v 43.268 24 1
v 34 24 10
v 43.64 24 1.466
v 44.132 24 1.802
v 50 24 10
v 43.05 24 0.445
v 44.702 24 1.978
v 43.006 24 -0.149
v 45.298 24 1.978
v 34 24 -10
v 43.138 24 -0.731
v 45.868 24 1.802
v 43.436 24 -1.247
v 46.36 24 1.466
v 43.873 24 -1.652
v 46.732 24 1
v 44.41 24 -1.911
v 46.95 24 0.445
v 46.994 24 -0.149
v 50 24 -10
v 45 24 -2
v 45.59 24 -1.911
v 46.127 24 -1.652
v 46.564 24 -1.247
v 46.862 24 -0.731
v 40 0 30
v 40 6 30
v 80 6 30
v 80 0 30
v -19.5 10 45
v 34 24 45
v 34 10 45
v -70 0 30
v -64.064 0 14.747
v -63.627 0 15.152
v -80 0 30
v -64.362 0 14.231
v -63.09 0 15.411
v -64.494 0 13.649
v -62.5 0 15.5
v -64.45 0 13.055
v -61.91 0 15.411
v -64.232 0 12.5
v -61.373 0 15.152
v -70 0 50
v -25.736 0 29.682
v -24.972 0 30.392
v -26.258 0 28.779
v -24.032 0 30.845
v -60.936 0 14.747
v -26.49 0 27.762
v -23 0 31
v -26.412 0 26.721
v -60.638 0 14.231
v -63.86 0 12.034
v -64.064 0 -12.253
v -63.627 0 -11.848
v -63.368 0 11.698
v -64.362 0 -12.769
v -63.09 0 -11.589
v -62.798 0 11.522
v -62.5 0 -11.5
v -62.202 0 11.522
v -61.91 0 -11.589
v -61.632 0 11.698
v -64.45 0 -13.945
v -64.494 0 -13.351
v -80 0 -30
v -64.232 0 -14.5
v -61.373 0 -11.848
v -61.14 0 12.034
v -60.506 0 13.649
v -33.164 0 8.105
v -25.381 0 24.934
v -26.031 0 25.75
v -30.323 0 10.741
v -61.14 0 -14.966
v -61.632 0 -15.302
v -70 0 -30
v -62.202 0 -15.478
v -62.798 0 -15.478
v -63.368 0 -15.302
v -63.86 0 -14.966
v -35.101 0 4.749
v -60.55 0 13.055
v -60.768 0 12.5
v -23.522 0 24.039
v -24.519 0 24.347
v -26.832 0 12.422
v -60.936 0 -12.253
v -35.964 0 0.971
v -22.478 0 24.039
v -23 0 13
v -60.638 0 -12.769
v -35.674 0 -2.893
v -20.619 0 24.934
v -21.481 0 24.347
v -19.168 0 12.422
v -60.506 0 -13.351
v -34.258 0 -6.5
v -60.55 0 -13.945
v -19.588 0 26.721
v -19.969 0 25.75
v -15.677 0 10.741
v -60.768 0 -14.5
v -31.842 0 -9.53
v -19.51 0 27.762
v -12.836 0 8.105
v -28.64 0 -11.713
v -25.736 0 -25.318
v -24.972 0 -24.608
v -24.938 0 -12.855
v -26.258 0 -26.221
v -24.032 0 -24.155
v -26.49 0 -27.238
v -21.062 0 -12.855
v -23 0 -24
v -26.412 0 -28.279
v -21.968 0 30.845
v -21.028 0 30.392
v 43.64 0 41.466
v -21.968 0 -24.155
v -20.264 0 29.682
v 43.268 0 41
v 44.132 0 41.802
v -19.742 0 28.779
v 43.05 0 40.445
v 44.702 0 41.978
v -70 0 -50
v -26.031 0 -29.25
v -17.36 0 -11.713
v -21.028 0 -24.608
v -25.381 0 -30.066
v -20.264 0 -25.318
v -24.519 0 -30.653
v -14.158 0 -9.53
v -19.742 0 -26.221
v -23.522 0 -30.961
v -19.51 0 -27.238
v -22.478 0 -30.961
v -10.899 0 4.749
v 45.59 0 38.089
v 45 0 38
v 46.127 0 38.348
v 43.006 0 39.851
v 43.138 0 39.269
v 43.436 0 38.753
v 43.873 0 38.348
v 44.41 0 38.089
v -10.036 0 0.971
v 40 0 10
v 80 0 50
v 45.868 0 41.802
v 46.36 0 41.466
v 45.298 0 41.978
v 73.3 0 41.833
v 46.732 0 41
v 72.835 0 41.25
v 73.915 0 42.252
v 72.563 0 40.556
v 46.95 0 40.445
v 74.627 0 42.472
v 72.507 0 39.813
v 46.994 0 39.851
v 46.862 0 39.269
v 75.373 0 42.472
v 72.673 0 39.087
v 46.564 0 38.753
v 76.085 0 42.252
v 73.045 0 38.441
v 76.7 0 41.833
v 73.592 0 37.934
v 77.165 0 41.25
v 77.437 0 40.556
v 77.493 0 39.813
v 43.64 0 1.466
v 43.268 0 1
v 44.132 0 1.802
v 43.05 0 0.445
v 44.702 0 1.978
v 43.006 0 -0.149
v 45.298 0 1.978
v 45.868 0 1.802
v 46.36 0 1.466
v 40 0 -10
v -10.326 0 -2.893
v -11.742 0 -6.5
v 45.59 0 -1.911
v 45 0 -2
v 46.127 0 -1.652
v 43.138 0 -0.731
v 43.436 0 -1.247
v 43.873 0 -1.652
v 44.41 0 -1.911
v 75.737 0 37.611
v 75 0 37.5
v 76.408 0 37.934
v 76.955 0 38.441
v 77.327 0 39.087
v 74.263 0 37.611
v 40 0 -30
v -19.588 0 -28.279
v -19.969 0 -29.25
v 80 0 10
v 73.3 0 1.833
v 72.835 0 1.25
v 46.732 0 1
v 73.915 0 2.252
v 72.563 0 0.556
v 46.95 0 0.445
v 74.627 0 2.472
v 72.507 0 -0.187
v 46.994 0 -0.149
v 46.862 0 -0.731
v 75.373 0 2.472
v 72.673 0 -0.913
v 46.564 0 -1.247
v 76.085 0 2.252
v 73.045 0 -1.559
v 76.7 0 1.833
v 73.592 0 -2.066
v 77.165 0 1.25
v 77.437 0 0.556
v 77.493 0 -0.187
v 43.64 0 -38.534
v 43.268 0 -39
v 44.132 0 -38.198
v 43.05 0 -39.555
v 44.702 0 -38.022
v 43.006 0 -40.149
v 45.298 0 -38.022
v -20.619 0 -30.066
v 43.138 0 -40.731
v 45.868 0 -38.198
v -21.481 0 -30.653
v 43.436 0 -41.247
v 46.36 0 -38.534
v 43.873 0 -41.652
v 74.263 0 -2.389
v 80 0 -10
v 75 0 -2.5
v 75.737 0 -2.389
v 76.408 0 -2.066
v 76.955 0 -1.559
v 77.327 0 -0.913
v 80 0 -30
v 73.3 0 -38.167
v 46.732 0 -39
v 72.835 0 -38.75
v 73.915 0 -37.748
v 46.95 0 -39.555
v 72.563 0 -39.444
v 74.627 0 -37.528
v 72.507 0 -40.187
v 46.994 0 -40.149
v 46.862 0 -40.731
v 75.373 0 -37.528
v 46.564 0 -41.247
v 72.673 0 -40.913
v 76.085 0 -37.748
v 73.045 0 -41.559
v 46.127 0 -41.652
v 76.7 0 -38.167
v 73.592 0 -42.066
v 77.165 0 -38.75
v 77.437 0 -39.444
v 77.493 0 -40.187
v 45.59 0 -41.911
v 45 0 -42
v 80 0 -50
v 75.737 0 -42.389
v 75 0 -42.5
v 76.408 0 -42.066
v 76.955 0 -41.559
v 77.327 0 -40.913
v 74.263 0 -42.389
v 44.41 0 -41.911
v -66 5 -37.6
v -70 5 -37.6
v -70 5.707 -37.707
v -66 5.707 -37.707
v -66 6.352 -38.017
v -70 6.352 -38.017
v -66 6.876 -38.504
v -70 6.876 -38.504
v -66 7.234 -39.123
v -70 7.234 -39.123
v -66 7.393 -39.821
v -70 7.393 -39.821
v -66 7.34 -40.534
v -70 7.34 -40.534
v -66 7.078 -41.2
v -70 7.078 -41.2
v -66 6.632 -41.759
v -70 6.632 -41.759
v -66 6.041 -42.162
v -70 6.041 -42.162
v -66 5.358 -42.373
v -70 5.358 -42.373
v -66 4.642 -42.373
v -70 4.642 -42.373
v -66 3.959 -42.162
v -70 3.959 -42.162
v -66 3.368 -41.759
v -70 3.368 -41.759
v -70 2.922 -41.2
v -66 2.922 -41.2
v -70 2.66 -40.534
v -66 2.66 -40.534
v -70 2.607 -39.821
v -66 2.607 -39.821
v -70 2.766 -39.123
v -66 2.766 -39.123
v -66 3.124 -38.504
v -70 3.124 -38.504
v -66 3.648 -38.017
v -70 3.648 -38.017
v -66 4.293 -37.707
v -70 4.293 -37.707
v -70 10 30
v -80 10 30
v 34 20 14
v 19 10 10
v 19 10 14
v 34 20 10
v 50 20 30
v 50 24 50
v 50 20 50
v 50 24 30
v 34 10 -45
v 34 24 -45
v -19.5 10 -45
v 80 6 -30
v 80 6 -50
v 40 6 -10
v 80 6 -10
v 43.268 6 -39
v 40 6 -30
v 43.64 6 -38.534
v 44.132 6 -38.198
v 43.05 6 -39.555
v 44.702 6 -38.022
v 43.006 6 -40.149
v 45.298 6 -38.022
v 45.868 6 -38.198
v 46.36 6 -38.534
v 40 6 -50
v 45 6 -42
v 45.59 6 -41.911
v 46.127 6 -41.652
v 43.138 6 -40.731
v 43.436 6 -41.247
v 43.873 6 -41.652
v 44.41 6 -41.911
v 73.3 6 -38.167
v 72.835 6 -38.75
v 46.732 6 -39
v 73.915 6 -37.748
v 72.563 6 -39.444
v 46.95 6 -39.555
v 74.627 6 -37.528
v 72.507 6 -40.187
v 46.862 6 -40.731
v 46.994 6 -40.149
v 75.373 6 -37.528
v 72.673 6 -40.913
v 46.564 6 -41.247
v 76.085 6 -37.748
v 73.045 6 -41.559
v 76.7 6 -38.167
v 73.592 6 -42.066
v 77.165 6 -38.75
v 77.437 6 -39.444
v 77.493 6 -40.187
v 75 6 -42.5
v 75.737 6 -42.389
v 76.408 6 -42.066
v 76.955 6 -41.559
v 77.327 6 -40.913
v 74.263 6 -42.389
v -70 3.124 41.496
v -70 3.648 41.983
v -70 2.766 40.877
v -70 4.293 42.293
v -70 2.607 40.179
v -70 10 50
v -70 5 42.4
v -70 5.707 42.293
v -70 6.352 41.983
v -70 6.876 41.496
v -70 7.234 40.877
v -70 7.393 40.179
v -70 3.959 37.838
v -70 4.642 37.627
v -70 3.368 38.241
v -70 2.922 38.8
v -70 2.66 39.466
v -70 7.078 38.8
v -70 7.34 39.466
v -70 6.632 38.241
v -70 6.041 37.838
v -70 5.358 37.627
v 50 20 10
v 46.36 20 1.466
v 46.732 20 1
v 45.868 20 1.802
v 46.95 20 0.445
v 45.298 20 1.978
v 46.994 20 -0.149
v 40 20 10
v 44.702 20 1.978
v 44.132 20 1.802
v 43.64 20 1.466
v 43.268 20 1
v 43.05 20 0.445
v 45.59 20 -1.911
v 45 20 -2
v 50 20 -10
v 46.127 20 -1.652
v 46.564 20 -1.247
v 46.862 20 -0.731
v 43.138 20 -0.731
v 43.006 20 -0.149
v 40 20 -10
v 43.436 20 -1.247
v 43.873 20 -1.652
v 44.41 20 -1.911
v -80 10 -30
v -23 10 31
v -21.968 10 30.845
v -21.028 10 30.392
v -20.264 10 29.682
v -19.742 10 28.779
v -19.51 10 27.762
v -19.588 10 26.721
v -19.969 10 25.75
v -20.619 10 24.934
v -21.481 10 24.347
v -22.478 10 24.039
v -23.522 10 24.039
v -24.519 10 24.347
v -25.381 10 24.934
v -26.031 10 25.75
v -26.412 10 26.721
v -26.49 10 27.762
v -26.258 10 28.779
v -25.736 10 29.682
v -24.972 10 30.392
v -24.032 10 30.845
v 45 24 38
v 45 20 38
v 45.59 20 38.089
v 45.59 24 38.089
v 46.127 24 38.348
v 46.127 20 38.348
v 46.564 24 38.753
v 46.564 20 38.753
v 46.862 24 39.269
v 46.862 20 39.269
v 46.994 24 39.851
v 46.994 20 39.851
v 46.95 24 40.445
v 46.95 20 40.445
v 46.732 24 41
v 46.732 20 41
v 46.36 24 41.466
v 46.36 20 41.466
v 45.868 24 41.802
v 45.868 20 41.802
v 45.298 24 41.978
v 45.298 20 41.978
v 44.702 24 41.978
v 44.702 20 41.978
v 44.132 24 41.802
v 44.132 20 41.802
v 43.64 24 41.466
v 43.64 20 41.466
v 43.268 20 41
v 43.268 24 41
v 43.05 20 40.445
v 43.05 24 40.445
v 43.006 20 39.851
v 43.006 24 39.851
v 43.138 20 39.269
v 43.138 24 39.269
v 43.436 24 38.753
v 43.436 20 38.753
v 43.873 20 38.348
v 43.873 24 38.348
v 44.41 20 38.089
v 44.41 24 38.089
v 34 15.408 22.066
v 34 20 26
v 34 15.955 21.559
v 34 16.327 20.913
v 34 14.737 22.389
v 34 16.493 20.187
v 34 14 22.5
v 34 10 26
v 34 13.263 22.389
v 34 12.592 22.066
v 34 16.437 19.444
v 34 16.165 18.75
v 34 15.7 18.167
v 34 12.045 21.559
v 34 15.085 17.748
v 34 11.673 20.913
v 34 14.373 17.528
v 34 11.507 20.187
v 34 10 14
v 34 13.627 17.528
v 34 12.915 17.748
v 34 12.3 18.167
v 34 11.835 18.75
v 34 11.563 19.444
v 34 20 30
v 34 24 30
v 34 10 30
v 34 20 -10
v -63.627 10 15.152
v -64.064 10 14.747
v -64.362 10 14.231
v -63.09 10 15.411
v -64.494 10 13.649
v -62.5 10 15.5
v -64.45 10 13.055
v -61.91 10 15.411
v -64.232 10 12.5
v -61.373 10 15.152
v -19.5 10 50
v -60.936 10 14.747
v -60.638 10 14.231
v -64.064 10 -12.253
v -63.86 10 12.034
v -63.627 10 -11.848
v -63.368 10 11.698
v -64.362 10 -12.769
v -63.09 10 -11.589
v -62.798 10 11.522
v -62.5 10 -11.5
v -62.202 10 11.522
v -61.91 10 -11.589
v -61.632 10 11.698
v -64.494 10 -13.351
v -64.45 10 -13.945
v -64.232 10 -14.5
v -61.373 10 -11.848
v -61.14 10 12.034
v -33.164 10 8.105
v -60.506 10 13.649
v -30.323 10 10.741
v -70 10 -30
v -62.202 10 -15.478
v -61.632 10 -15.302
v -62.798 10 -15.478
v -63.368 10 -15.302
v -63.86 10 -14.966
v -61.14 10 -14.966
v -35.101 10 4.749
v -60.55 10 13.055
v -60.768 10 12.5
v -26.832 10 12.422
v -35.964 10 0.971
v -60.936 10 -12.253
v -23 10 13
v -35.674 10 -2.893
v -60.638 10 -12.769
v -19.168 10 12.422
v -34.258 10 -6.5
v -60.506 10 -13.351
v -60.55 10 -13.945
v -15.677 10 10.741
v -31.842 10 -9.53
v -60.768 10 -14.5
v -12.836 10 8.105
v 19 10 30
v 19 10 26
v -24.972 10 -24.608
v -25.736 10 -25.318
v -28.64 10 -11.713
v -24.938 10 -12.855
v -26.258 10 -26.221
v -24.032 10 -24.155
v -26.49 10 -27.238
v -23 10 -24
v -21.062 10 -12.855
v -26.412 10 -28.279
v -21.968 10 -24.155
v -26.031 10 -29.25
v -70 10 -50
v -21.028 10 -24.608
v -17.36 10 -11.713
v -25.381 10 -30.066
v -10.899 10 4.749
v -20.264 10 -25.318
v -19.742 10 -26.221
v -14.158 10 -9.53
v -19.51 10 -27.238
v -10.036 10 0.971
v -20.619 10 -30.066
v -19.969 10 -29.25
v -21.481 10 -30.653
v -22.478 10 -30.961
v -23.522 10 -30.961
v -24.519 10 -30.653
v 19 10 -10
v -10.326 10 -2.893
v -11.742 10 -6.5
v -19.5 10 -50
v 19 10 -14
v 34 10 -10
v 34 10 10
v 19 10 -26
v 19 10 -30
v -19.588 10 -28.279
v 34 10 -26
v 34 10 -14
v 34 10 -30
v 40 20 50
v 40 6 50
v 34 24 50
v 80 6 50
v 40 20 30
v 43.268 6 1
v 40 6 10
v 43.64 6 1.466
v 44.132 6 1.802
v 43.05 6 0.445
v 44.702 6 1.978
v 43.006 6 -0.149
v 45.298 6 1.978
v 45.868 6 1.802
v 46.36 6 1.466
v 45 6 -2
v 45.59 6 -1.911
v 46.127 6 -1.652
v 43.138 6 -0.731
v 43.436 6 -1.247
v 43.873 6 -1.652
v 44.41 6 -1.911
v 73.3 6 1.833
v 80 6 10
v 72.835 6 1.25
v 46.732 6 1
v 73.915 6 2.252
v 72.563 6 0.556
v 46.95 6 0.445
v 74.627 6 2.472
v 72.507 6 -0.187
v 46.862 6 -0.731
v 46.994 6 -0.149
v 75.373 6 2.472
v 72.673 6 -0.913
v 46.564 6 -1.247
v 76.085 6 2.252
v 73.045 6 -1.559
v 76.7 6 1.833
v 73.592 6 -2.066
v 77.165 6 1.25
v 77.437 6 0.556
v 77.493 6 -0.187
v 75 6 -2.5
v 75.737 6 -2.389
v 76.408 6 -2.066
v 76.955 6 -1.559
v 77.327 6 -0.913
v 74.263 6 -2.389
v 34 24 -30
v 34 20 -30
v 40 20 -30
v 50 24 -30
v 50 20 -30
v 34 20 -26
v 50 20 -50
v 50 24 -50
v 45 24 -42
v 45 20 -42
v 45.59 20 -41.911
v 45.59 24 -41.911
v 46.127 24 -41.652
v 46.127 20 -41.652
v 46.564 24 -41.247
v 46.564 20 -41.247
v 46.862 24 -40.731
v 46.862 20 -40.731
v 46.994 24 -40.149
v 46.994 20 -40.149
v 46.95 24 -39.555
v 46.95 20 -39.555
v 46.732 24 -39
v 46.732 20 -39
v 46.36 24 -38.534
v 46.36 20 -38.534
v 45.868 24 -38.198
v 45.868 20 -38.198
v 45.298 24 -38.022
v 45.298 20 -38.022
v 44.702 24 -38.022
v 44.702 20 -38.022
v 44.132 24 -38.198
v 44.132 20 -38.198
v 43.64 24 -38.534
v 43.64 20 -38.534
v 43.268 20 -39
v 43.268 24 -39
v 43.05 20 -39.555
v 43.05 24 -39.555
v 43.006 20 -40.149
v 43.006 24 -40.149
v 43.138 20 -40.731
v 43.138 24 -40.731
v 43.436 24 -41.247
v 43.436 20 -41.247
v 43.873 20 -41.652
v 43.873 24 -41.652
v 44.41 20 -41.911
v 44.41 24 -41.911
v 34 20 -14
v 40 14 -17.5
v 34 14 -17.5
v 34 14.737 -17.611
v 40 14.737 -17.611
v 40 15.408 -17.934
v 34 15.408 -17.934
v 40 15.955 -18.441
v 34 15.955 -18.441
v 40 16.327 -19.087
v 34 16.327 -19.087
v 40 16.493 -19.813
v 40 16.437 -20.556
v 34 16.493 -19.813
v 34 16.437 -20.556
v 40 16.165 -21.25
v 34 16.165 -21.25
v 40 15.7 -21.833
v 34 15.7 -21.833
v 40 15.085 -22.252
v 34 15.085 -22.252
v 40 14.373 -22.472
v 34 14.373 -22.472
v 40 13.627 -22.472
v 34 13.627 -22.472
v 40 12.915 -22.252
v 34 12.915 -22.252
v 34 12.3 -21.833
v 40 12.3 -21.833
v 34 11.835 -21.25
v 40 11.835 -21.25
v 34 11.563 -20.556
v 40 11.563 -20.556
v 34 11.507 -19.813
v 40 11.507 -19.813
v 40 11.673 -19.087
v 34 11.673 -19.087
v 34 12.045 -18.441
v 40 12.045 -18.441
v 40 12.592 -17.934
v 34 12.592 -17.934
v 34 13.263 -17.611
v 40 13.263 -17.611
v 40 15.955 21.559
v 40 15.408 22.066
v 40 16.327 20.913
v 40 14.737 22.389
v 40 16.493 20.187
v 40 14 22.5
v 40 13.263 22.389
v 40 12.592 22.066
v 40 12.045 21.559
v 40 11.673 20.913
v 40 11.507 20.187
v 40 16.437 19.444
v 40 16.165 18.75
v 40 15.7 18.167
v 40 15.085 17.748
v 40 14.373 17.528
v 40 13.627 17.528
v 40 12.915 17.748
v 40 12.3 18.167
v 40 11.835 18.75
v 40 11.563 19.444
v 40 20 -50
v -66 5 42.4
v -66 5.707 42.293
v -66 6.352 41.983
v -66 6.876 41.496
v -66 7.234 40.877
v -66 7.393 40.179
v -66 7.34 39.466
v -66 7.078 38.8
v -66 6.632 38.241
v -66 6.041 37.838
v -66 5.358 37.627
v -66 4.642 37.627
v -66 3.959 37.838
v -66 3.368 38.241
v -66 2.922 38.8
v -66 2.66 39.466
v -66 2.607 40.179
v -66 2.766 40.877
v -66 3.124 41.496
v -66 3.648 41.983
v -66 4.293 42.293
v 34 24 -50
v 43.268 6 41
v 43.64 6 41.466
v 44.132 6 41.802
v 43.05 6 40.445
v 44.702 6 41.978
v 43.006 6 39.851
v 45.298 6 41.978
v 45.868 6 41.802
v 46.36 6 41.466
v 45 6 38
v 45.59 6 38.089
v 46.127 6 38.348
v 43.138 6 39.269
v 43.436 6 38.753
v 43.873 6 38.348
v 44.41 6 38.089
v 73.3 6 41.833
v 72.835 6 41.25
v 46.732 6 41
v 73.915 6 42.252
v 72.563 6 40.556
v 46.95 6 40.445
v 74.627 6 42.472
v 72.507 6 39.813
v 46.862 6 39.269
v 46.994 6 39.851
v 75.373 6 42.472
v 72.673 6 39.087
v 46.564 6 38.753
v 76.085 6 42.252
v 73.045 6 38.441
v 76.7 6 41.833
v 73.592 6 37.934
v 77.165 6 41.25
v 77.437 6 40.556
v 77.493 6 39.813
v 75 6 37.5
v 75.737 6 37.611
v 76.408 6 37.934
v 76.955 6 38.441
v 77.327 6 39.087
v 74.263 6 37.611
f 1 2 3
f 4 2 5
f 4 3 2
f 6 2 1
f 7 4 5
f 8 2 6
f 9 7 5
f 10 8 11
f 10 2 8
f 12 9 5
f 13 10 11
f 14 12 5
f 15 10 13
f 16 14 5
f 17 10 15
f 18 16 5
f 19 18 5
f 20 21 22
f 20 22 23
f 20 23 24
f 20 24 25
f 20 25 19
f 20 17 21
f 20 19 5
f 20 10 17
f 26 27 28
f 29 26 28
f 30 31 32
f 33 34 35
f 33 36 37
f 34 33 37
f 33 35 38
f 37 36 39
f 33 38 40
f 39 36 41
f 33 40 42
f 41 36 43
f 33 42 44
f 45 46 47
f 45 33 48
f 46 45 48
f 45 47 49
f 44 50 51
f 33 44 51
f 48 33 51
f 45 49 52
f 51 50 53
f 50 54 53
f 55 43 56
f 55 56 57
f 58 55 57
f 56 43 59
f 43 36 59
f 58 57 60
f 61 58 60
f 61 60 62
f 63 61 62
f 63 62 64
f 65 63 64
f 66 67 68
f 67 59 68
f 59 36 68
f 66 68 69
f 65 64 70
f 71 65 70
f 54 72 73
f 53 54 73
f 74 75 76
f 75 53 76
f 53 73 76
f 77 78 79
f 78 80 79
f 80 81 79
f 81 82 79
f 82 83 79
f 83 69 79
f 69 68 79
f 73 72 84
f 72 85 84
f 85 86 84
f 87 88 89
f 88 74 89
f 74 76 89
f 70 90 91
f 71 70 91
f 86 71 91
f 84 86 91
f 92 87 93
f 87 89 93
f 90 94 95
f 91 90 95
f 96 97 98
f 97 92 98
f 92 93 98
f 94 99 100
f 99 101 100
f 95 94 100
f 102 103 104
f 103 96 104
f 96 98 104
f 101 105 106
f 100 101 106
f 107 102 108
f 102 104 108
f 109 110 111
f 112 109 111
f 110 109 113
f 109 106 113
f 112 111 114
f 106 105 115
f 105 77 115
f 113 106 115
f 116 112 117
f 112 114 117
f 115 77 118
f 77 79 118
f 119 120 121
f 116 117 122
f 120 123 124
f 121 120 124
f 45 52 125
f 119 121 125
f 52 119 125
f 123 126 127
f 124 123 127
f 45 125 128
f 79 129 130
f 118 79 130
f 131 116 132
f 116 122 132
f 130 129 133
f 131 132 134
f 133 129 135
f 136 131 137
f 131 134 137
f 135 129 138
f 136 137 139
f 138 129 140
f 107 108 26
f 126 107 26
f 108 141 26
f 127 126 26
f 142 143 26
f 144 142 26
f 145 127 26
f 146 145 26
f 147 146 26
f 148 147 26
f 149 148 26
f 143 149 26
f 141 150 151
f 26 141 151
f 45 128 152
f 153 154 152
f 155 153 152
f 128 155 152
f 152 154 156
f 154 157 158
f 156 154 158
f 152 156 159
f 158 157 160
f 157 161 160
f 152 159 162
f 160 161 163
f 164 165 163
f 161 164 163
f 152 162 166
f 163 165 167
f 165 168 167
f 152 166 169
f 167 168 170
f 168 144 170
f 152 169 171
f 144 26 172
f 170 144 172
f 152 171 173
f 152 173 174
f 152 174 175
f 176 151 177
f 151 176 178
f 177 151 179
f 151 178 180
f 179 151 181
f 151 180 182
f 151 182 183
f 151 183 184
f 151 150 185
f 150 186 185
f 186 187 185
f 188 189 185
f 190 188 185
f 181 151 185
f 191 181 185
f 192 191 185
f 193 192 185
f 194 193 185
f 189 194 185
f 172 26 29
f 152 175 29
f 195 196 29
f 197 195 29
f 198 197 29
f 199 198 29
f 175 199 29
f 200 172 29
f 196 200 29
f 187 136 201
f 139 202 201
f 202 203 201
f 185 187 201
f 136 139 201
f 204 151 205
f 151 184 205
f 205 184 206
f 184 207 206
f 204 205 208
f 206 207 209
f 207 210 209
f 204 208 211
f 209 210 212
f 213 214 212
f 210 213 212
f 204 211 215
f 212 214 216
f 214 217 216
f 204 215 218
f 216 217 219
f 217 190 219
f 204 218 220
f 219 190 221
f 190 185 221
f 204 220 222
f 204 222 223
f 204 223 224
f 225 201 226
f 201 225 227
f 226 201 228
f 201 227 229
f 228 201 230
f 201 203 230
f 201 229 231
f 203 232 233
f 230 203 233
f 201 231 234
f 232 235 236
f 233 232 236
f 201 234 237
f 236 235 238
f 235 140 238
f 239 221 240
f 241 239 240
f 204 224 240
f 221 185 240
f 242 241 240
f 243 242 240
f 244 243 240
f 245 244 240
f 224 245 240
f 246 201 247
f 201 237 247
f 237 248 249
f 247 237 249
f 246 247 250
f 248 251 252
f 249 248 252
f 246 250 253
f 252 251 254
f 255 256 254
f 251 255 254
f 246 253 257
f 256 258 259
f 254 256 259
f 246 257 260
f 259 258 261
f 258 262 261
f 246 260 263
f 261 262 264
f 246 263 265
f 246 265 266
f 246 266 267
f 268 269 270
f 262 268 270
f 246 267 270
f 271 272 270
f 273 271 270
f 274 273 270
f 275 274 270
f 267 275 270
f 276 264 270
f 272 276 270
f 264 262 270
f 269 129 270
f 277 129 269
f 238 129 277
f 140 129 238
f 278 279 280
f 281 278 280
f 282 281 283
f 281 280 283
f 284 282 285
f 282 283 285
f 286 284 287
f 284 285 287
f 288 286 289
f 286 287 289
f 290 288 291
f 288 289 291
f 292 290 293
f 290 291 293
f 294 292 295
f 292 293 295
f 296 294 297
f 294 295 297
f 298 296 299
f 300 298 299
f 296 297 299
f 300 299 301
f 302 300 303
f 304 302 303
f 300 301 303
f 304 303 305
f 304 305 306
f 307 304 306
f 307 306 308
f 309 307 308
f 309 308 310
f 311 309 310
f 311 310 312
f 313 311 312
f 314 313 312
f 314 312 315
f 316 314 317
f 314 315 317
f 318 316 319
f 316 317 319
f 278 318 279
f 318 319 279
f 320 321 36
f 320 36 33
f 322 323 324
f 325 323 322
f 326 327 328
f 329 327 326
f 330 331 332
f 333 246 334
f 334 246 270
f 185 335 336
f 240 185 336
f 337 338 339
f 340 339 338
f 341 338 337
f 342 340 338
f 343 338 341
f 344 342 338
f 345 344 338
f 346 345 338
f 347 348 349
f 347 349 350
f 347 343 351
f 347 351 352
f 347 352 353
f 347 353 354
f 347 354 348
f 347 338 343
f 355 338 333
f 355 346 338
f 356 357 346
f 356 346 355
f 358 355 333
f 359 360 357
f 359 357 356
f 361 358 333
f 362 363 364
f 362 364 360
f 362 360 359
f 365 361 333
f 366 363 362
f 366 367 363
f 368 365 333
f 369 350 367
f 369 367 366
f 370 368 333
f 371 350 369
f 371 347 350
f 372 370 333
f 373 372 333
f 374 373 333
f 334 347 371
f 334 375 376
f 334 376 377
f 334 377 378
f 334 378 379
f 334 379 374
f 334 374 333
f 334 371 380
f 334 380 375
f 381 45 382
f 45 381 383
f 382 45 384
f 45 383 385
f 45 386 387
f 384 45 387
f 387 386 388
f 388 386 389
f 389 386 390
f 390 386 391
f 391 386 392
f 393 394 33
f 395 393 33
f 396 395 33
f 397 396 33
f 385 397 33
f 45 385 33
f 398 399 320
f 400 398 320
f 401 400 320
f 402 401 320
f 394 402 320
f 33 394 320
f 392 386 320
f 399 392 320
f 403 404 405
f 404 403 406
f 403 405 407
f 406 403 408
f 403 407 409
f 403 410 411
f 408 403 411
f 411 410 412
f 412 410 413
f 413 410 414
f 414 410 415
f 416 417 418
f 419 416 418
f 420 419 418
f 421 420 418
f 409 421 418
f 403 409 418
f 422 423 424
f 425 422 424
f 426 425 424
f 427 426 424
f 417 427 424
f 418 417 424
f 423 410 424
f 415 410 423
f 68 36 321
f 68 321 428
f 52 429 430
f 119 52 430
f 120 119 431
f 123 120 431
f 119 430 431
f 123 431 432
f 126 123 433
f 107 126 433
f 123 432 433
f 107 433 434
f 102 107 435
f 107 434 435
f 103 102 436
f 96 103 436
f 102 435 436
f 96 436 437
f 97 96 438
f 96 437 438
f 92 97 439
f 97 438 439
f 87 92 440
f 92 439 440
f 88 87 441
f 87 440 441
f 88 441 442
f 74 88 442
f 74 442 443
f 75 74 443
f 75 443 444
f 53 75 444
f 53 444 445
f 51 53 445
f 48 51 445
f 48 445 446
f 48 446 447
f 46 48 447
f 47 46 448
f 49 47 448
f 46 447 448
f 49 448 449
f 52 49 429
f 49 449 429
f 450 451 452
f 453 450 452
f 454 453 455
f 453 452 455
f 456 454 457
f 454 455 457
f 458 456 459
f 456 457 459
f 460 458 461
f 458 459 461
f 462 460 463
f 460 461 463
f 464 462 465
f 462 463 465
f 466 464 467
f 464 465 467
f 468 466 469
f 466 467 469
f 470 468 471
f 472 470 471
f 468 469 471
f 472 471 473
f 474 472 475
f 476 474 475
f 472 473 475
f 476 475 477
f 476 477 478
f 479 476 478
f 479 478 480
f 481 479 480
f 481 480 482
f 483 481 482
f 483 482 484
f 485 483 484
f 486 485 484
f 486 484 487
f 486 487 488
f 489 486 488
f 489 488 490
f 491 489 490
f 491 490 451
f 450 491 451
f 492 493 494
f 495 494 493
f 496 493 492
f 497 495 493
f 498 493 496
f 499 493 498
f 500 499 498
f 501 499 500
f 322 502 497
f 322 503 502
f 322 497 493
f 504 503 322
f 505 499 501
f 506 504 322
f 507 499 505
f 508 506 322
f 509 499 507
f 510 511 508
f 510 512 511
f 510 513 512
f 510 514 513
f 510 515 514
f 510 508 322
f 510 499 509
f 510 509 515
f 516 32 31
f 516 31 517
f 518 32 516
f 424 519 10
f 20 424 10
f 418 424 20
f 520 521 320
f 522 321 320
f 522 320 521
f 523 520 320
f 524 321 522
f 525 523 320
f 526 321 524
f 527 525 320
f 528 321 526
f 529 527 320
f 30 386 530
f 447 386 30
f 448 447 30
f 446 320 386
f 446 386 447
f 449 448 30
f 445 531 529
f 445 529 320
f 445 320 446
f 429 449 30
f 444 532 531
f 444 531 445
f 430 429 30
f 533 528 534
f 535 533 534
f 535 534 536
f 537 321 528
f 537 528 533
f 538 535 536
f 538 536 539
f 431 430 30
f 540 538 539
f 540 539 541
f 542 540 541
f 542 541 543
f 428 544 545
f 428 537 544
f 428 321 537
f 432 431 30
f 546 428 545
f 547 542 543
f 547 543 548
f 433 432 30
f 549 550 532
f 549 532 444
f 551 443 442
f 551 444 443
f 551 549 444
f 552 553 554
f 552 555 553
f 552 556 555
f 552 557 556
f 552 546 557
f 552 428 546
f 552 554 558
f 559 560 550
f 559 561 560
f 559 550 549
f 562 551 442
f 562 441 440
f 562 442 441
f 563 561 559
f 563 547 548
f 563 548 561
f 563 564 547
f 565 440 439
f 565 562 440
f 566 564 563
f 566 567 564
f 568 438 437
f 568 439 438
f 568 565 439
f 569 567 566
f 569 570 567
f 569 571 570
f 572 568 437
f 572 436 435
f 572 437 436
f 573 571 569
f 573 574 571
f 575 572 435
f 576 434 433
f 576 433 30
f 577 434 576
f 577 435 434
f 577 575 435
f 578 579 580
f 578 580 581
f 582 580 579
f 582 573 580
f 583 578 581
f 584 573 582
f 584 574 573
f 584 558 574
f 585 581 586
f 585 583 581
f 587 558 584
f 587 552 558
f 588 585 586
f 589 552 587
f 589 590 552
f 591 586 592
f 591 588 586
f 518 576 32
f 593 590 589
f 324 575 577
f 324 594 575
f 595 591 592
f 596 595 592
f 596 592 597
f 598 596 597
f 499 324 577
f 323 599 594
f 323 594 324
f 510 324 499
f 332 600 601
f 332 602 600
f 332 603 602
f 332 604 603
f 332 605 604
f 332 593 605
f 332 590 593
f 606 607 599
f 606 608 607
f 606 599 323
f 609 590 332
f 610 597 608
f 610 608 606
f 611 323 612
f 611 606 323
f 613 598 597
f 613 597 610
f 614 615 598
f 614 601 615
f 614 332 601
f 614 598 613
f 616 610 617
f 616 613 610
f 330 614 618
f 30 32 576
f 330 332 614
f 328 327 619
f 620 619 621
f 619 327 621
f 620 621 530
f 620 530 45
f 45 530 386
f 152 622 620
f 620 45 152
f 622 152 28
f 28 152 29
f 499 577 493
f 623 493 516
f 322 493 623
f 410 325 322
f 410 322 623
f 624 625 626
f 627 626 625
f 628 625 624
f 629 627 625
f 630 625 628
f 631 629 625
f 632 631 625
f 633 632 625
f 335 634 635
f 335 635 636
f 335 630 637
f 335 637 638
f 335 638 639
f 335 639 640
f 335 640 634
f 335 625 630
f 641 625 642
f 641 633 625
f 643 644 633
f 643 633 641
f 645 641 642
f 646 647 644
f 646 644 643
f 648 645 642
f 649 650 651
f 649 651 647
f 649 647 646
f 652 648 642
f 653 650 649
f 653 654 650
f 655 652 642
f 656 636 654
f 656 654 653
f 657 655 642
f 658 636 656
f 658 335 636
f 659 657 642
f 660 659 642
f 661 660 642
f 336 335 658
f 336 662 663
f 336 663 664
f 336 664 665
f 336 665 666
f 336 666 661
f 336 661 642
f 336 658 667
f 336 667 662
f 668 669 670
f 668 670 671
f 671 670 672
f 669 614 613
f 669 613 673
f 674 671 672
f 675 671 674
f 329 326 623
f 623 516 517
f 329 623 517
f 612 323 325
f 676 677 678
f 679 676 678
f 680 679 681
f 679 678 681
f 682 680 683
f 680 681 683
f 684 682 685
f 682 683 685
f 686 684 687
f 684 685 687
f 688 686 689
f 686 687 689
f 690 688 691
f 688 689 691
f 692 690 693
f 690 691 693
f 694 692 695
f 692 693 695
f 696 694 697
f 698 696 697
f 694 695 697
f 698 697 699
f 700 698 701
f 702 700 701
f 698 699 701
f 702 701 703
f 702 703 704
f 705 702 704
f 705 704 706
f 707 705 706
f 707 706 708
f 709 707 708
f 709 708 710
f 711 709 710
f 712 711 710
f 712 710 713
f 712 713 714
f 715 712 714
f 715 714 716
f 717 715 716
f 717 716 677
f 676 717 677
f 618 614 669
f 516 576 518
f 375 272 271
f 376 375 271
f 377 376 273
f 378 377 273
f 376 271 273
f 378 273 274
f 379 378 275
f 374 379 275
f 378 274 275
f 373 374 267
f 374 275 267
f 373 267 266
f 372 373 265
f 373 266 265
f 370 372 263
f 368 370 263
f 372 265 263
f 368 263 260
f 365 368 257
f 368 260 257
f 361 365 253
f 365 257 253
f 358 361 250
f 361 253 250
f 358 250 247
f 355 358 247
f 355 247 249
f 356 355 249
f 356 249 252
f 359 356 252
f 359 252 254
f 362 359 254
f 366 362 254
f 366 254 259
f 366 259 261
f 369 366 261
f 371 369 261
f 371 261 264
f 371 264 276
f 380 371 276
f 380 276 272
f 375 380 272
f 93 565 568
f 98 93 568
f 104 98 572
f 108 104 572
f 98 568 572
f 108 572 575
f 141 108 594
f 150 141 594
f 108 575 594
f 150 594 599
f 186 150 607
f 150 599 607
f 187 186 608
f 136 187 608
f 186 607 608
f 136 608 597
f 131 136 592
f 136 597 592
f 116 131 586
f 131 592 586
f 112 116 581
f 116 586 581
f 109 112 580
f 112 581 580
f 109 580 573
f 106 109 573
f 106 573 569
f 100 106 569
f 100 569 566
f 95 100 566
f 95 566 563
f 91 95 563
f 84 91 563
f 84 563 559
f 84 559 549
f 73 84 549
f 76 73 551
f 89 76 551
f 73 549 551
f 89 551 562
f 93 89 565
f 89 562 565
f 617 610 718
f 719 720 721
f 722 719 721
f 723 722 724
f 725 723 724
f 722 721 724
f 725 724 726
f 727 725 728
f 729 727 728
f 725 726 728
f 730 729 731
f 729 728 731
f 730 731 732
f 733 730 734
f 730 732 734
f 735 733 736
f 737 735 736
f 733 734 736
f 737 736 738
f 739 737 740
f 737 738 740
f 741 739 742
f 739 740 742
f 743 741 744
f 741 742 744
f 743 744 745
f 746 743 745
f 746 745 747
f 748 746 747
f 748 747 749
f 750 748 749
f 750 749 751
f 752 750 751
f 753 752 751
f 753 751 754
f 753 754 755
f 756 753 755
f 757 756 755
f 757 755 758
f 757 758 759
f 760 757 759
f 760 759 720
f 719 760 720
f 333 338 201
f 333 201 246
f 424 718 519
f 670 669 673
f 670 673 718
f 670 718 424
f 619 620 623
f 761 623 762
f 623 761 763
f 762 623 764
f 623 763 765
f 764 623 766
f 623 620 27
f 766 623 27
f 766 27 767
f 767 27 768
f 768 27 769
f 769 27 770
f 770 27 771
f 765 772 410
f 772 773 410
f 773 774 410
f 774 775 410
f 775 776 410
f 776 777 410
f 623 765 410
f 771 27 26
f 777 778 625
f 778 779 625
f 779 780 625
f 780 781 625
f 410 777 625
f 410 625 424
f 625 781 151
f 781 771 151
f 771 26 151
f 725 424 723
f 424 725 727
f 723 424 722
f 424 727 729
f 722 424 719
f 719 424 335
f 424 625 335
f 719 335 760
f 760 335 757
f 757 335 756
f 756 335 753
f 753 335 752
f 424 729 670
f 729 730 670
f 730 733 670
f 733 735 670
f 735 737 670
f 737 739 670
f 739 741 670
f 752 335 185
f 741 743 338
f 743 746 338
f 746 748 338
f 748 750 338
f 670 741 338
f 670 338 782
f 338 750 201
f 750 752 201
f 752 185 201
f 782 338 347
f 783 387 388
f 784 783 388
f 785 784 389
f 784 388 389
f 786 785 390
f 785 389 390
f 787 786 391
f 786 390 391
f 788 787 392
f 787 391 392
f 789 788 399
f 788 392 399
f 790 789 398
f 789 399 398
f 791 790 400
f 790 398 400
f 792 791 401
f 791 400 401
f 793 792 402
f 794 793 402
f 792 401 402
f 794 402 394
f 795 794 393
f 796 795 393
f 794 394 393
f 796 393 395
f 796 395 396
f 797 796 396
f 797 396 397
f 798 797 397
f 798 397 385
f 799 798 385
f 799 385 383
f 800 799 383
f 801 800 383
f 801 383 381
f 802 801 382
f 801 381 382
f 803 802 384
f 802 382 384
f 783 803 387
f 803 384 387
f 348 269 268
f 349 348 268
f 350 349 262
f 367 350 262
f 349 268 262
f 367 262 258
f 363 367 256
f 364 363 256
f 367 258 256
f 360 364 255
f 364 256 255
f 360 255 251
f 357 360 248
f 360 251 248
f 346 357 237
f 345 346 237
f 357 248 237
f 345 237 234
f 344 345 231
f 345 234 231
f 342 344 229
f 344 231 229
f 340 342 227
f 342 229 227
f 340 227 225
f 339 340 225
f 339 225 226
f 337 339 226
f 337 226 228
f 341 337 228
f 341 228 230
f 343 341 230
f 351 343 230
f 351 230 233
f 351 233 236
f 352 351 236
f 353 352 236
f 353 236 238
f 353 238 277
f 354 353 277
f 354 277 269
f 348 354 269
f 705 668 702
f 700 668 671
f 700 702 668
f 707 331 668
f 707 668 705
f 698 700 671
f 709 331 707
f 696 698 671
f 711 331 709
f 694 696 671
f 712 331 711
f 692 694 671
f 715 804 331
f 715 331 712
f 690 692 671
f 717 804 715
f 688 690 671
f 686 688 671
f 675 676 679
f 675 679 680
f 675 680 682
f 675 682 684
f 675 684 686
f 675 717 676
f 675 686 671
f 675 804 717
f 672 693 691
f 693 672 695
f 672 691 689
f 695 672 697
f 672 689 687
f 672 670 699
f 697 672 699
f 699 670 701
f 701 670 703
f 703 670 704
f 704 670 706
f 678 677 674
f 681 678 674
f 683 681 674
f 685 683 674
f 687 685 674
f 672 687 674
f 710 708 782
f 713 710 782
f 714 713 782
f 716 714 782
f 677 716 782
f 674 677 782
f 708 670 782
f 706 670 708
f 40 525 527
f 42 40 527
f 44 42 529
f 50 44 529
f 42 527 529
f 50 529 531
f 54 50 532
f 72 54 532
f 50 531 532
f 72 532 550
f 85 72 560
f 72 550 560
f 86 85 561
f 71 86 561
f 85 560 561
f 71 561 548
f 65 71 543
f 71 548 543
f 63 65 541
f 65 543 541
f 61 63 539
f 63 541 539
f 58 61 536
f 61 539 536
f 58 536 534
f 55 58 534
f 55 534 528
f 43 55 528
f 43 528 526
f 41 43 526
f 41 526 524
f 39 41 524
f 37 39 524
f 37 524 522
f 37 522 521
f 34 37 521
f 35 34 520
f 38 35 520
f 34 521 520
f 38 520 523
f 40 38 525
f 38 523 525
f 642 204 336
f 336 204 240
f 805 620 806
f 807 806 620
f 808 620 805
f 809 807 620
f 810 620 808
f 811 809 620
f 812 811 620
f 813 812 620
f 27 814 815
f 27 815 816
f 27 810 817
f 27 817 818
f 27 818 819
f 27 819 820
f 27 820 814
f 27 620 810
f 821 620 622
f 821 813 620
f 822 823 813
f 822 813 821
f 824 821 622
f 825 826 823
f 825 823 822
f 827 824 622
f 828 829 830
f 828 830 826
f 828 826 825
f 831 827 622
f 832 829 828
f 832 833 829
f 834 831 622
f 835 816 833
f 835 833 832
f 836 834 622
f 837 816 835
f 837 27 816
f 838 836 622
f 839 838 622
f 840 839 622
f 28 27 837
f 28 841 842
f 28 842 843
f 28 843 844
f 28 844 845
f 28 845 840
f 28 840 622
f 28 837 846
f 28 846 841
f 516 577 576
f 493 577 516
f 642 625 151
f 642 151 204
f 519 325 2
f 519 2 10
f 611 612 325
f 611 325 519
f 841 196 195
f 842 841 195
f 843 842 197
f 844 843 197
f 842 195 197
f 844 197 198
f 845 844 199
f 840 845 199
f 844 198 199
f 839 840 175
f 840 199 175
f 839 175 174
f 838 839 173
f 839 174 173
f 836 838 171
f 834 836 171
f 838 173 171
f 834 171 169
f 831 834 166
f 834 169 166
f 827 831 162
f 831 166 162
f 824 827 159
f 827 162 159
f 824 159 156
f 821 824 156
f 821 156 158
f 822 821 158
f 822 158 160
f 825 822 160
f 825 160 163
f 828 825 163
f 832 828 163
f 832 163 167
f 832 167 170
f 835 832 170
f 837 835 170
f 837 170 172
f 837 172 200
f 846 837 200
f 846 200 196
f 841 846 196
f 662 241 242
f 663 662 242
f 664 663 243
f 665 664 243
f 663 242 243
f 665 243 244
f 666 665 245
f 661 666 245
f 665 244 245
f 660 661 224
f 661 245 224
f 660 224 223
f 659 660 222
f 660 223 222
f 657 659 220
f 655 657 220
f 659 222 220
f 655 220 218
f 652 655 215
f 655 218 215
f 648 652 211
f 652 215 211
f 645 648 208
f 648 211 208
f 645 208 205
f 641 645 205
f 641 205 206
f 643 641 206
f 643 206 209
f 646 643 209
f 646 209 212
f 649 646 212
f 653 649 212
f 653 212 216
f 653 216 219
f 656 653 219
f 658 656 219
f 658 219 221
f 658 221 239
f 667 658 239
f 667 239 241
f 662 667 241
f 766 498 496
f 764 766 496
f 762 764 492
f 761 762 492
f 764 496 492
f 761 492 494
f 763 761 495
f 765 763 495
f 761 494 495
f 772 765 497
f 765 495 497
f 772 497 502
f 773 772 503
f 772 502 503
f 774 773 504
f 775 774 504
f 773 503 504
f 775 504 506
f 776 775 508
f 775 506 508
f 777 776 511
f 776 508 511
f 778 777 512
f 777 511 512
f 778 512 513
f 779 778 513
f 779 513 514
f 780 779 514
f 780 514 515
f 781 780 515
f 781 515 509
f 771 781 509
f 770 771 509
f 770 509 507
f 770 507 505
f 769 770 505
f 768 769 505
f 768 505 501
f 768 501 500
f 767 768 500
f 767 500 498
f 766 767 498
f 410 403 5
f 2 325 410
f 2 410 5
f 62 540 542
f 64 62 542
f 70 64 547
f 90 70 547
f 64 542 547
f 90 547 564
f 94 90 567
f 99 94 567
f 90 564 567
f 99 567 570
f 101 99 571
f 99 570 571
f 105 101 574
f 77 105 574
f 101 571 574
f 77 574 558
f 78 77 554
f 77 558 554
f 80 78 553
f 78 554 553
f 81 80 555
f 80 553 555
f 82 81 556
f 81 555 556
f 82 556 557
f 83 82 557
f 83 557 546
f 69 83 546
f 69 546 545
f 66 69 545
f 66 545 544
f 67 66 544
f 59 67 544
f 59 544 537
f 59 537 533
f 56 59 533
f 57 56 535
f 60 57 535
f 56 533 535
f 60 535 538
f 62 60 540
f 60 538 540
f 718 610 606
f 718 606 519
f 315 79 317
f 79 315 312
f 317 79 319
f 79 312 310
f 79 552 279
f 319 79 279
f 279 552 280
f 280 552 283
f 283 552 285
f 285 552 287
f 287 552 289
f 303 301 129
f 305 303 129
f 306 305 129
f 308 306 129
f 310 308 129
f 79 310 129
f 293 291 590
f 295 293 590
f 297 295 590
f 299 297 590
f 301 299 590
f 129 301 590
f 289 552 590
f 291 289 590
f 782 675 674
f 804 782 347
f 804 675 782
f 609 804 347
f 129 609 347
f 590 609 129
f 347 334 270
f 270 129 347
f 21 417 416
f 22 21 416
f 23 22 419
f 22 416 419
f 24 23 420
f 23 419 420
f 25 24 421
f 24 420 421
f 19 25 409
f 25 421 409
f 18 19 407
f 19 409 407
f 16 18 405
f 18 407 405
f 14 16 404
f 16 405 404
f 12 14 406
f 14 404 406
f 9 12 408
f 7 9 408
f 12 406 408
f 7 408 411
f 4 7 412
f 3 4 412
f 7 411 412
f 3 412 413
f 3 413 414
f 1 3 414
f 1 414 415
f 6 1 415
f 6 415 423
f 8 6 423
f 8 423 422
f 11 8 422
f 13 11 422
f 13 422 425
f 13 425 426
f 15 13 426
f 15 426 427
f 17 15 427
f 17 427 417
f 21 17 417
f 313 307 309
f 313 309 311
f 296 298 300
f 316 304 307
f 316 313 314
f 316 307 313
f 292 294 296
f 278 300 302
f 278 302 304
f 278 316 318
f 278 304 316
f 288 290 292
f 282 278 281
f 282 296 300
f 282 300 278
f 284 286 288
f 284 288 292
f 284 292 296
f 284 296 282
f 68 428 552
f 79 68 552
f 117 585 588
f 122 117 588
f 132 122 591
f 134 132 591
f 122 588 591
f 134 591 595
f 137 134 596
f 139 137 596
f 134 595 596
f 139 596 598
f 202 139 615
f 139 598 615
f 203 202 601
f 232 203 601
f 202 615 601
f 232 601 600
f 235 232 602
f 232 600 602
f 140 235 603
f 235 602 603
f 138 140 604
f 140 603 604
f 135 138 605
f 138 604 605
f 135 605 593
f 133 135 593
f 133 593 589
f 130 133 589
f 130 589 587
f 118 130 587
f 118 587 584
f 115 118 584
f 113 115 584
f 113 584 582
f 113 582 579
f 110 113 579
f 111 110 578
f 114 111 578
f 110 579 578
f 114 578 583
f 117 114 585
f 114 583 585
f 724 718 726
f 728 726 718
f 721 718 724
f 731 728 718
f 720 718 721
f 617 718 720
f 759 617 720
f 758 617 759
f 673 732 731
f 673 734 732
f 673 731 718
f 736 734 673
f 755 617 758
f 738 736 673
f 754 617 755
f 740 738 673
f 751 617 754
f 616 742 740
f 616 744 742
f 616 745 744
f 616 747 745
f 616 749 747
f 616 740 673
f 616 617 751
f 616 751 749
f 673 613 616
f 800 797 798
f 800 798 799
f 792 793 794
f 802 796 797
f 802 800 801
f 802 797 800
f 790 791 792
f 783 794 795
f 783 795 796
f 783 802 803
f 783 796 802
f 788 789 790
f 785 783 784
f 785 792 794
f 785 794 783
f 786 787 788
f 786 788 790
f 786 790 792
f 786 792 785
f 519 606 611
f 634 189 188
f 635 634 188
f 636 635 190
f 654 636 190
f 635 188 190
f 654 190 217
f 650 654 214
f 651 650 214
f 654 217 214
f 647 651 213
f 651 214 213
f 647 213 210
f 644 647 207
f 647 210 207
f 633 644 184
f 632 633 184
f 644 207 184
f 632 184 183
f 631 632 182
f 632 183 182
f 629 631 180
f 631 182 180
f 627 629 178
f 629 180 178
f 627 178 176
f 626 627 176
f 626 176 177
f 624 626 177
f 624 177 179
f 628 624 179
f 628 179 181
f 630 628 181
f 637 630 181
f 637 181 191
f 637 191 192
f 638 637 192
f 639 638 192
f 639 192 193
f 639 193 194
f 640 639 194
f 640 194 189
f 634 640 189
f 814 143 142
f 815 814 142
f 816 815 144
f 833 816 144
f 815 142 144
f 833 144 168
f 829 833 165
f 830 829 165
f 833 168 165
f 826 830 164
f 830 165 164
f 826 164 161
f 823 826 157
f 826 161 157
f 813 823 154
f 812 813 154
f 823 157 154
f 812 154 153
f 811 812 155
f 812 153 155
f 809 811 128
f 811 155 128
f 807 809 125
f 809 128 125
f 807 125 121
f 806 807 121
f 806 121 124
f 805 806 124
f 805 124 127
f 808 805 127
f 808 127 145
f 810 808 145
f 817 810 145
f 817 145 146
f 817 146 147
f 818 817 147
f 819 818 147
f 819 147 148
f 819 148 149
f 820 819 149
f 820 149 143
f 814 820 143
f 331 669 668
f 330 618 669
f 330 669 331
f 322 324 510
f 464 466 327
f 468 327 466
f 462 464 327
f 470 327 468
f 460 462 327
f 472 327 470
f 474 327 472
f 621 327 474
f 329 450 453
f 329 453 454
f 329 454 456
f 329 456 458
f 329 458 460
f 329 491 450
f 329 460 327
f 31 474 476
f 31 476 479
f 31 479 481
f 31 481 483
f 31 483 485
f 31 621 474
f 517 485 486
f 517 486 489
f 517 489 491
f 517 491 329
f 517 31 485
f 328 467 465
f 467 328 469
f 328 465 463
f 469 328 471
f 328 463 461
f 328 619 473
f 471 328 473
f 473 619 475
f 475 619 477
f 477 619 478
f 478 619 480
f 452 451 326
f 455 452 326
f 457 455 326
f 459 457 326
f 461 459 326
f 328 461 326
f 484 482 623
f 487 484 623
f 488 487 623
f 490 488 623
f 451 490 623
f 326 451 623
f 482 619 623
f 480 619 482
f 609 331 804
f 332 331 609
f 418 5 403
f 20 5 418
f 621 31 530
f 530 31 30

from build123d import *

# Parameters (mm, degrees)
SKETCH1_W           = 160
SKETCH1_H           = 100
BOSS_EXTRUDE1_DEPTH = 10
SKETCH2_W           = 40
SKETCH2_H           = 20
CUT_EXTRUDE1_DEPTH  = 10
SKETCH3_W           = 6
SKETCH3_H           = 20
BOSS_EXTRUDE2_DEPTH = 10
SKETCH4_W           = 40
SKETCH4_H           = 20
CUT_EXTRUDE2_DEPTH  = 4
SKETCH5_W           = 15
SKETCH5_H           = 4
BOSS_EXTRUDE3_DEPTH = 10
CUT_EXTRUDE3_DEPTH  = 100
SKETCH8_R           = 2.5
SKETCH8_R_2         = 2
CUT_EXTRUDE4_DEPTH  = 97.43650761
SKETCH10_W          = 6
SKETCH10_H          = 20
BOSS_EXTRUDE5_DEPTH = 14
SKETCH11_W          = 20
SKETCH11_H          = 4
BOSS_EXTRUDE6_DEPTH = 10
SKETCH12_R          = 2
CUT_EXTRUDE5_DEPTH  = 10
SKETCH13_R          = 2.5
CUT_EXTRUDE6_DEPTH  = 10
SKETCH14_W          = 10
SKETCH14_H          = 20
CUT_EXTRUDE7_DEPTH  = 10
SKETCH17_R          = 2
CUT_EXTRUDE8_DEPTH  = 10
SKETCH18_R          = 2.4
CUT_EXTRUDE9_DEPTH  = 4
SKETCH15_R          = 13
SKETCH15_R_2        = 3.5
CUT_EXTRUDE10_DEPTH = 10
RIB1_REACH          = 132.292
SKETCH19_WALL_W     = 317.885406234
SKETCH19_WALL_H     = 5


with BuildPart() as part:
    # Sketch1 → Boss-Extrude1 (new body)
    with BuildSketch(Plane(origin=(0, 0, 0), x_dir=(1, 0, 0), z_dir=(0, 1, 0))):
        Rectangle(SKETCH1_W, SKETCH1_H)
    extrude(amount=BOSS_EXTRUDE1_DEPTH)

    # Sketch2 → Cut-Extrude1 (cut)
    with BuildSketch(Plane(origin=(0, 10, 0), x_dir=(1, 0, 0), z_dir=(0, 1, 0))):
        with Locations((60, 20)):
            Rectangle(SKETCH2_W, SKETCH2_H)
        with Locations((60, -20)):
            Rectangle(SKETCH2_W, SKETCH2_H)
    extrude(amount=-CUT_EXTRUDE1_DEPTH, mode=Mode.SUBTRACT)

    # Sketch3 → Boss-Extrude2 (add)
    with BuildSketch(Plane(origin=(0, 10, 0), x_dir=(1, 0, 0), z_dir=(0, 1, 0))):
        with Locations((37, 20)):
            Rectangle(SKETCH3_W, SKETCH3_H)
        with Locations((37, -20)):
            Rectangle(SKETCH3_W, SKETCH3_H)
    extrude(amount=BOSS_EXTRUDE2_DEPTH)

    # Sketch4 → Cut-Extrude2 (cut)
    with BuildSketch(Plane(origin=(0, 10, 0), x_dir=(1, 0, 0), z_dir=(0, 1, 0))):
        with Locations((60, 40)):
            Rectangle(SKETCH4_W, SKETCH4_H)
        with Locations((60, 0)):
            Rectangle(SKETCH4_W, SKETCH4_H)
        with Locations((60, -40)):
            Rectangle(SKETCH4_W, SKETCH4_H)
    extrude(amount=-CUT_EXTRUDE2_DEPTH, mode=Mode.SUBTRACT)

    # Sketch5 → Boss-Extrude3 (add)
    with BuildSketch(Plane(origin=(0, 10, 0), x_dir=(1, 0, 0), z_dir=(0, 1, 0))):
        with Locations((26.5, 28)):
            Rectangle(SKETCH5_W, SKETCH5_H)
        with Locations((26.5, 12)):
            Rectangle(SKETCH5_W, SKETCH5_H)
        with Locations((26.5, -12)):
            Rectangle(SKETCH5_W, SKETCH5_H)
        with Locations((26.5, -28)):
            Rectangle(SKETCH5_W, SKETCH5_H)
    extrude(amount=BOSS_EXTRUDE3_DEPTH)

    # Sketch6 → Cut-Extrude3 (cut)
    with BuildSketch(Plane(origin=(0, 0, -30), x_dir=(-1, 0, 0), z_dir=(0, 0, -1))):
        Polygon((-19, 10), (-34, 20), (-19, 20), align=None)
    extrude(amount=-CUT_EXTRUDE3_DEPTH, mode=Mode.SUBTRACT)

    # Sketch8 → Cut-Extrude4 (cut, through all)
    with BuildSketch(Plane.XZ):
        with Locations(Location((75, 40, 0), (0, 0, 270))):
            Circle(SKETCH8_R)
        with Locations(Location((75, 0, 0), (0, 0, 270))):
            Circle(SKETCH8_R)
        with Locations(Location((75, -40, 0), (0, 0, 270))):
            Circle(SKETCH8_R)
        with Locations(Location((45, 40, 0), (0, 0, 270))):
            Circle(SKETCH8_R_2)
        with Locations(Location((45, 0, 0), (0, 0, 270))):
            Circle(SKETCH8_R_2)
        with Locations(Location((45, -40, 0), (0, 0, 270))):
            Circle(SKETCH8_R_2)
    extrude(amount=-CUT_EXTRUDE4_DEPTH, mode=Mode.SUBTRACT)

    # Sketch10 → Boss-Extrude5 (add)
    with BuildSketch(Plane(origin=(0, 10, 0), x_dir=(1, 0, 0), z_dir=(0, 1, 0))):
        with Locations((37, 40)):
            Rectangle(SKETCH10_W, SKETCH10_H)
        with Locations((37, -40)):
            Rectangle(SKETCH10_W, SKETCH10_H)
        with Locations((37, 0)):
            Rectangle(SKETCH10_W, SKETCH10_H)
    extrude(amount=BOSS_EXTRUDE5_DEPTH)

    # Sketch11 → Boss-Extrude6 (add)
    with BuildSketch(Plane(origin=(40, 0, 0), x_dir=(0, 0, -1), z_dir=(1, 0, 0))):
        with Locations((-40, 22)):
            Rectangle(SKETCH11_W, SKETCH11_H)
        with Locations((0, 22)):
            Rectangle(SKETCH11_W, SKETCH11_H)
        with Locations((40, 22)):
            Rectangle(SKETCH11_W, SKETCH11_H)
    extrude(amount=BOSS_EXTRUDE6_DEPTH)

    # Sketch12 → Cut-Extrude5 (cut)
    with BuildSketch(Plane.XZ.offset(-20)):
        with Locations(Location((45, 40, 0), (0, 0, 270))):
            Circle(SKETCH12_R)
        with Locations(Location((45, 0, 0), (0, 0, 270))):
            Circle(SKETCH12_R)
        with Locations(Location((45, -40, 0), (0, 0, 270))):
            Circle(SKETCH12_R)
    extrude(amount=-CUT_EXTRUDE5_DEPTH, mode=Mode.SUBTRACT)

    # Sketch13 → Cut-Extrude6 (cut)
    with BuildSketch(Plane.ZY.offset(-34)):
        with Locations((-20, 14)):
            Circle(SKETCH13_R)
        with Locations((20, 14)):
            Circle(SKETCH13_R)
    extrude(amount=-CUT_EXTRUDE6_DEPTH, mode=Mode.SUBTRACT)

    # Sketch14 → Cut-Extrude7 (cut)
    with BuildSketch(Plane(origin=(0, 10, 0), x_dir=(1, 0, 0), z_dir=(0, 1, 0))):
        with Locations((-75, 40)):
            Rectangle(SKETCH14_W, SKETCH14_H)
        with Locations((-75, -40)):
            Rectangle(SKETCH14_W, SKETCH14_H)
    extrude(amount=-CUT_EXTRUDE7_DEPTH, mode=Mode.SUBTRACT)

    # Sketch17 → Cut-Extrude8 (cut)
    with BuildSketch(Plane(origin=(0, 10, 0), x_dir=(1, 0, 0), z_dir=(0, 1, 0))):
        with Locations(Location((-62.5, 13.5, 0), (0, 0, 270))):
            Circle(SKETCH17_R)
        with Locations(Location((-62.5, -13.5, 0), (0, 0, 270))):
            Circle(SKETCH17_R)
    extrude(amount=-CUT_EXTRUDE8_DEPTH, mode=Mode.SUBTRACT)

    # Sketch18 → Cut-Extrude9 (cut)
    with BuildSketch(Plane.ZY.offset(70)):
        with Locations((40, 5)):
            Circle(SKETCH18_R)
        with Locations((-40, 5)):
            Circle(SKETCH18_R)
    extrude(amount=-CUT_EXTRUDE9_DEPTH, mode=Mode.SUBTRACT)

    # Sketch15 → Cut-Extrude10 (cut)
    with BuildSketch(Plane(origin=(0, 10, 0), x_dir=(1, 0, 0), z_dir=(0, 1, 0))):
        with Locations(Location((-23, 0, 0), (0, 0, 270))):
            Circle(SKETCH15_R)
        with Locations(Location((-23, 27.5, 0), (0, 0, 270))):
            Circle(SKETCH15_R_2)
        with Locations(Location((-23, -27.5, 0), (0, 0, 270))):
            Circle(SKETCH15_R_2)
    extrude(amount=-CUT_EXTRUDE10_DEPTH, mode=Mode.SUBTRACT)

    # Sketch19 wall → Rib1 (add, up to next)
    with BuildSketch(Plane(origin=(7.25, 17, -50), x_dir=(-0.967424963626, -0.253157934407, 0), z_dir=(-0.253157934407, 0.967424963626, 0)), mode=Mode.PRIVATE) as rib1_sk1:
        with Locations((0, 2.5)):
            Rectangle(SKETCH19_WALL_W, SKETCH19_WALL_H)
    rib1_tool1 = extrude(rib1_sk1.sketch, amount=-RIB1_REACH, mode=Mode.PRIVATE) - part.part
    rib1 = rib1_tool1.solids().sort_by_distance((7.25, 17, -50))[0]
    add(rib1)

    # Mirror2: Rib1 across plane
    add(rib1.mirror(Plane.XY))


solid = part.part
